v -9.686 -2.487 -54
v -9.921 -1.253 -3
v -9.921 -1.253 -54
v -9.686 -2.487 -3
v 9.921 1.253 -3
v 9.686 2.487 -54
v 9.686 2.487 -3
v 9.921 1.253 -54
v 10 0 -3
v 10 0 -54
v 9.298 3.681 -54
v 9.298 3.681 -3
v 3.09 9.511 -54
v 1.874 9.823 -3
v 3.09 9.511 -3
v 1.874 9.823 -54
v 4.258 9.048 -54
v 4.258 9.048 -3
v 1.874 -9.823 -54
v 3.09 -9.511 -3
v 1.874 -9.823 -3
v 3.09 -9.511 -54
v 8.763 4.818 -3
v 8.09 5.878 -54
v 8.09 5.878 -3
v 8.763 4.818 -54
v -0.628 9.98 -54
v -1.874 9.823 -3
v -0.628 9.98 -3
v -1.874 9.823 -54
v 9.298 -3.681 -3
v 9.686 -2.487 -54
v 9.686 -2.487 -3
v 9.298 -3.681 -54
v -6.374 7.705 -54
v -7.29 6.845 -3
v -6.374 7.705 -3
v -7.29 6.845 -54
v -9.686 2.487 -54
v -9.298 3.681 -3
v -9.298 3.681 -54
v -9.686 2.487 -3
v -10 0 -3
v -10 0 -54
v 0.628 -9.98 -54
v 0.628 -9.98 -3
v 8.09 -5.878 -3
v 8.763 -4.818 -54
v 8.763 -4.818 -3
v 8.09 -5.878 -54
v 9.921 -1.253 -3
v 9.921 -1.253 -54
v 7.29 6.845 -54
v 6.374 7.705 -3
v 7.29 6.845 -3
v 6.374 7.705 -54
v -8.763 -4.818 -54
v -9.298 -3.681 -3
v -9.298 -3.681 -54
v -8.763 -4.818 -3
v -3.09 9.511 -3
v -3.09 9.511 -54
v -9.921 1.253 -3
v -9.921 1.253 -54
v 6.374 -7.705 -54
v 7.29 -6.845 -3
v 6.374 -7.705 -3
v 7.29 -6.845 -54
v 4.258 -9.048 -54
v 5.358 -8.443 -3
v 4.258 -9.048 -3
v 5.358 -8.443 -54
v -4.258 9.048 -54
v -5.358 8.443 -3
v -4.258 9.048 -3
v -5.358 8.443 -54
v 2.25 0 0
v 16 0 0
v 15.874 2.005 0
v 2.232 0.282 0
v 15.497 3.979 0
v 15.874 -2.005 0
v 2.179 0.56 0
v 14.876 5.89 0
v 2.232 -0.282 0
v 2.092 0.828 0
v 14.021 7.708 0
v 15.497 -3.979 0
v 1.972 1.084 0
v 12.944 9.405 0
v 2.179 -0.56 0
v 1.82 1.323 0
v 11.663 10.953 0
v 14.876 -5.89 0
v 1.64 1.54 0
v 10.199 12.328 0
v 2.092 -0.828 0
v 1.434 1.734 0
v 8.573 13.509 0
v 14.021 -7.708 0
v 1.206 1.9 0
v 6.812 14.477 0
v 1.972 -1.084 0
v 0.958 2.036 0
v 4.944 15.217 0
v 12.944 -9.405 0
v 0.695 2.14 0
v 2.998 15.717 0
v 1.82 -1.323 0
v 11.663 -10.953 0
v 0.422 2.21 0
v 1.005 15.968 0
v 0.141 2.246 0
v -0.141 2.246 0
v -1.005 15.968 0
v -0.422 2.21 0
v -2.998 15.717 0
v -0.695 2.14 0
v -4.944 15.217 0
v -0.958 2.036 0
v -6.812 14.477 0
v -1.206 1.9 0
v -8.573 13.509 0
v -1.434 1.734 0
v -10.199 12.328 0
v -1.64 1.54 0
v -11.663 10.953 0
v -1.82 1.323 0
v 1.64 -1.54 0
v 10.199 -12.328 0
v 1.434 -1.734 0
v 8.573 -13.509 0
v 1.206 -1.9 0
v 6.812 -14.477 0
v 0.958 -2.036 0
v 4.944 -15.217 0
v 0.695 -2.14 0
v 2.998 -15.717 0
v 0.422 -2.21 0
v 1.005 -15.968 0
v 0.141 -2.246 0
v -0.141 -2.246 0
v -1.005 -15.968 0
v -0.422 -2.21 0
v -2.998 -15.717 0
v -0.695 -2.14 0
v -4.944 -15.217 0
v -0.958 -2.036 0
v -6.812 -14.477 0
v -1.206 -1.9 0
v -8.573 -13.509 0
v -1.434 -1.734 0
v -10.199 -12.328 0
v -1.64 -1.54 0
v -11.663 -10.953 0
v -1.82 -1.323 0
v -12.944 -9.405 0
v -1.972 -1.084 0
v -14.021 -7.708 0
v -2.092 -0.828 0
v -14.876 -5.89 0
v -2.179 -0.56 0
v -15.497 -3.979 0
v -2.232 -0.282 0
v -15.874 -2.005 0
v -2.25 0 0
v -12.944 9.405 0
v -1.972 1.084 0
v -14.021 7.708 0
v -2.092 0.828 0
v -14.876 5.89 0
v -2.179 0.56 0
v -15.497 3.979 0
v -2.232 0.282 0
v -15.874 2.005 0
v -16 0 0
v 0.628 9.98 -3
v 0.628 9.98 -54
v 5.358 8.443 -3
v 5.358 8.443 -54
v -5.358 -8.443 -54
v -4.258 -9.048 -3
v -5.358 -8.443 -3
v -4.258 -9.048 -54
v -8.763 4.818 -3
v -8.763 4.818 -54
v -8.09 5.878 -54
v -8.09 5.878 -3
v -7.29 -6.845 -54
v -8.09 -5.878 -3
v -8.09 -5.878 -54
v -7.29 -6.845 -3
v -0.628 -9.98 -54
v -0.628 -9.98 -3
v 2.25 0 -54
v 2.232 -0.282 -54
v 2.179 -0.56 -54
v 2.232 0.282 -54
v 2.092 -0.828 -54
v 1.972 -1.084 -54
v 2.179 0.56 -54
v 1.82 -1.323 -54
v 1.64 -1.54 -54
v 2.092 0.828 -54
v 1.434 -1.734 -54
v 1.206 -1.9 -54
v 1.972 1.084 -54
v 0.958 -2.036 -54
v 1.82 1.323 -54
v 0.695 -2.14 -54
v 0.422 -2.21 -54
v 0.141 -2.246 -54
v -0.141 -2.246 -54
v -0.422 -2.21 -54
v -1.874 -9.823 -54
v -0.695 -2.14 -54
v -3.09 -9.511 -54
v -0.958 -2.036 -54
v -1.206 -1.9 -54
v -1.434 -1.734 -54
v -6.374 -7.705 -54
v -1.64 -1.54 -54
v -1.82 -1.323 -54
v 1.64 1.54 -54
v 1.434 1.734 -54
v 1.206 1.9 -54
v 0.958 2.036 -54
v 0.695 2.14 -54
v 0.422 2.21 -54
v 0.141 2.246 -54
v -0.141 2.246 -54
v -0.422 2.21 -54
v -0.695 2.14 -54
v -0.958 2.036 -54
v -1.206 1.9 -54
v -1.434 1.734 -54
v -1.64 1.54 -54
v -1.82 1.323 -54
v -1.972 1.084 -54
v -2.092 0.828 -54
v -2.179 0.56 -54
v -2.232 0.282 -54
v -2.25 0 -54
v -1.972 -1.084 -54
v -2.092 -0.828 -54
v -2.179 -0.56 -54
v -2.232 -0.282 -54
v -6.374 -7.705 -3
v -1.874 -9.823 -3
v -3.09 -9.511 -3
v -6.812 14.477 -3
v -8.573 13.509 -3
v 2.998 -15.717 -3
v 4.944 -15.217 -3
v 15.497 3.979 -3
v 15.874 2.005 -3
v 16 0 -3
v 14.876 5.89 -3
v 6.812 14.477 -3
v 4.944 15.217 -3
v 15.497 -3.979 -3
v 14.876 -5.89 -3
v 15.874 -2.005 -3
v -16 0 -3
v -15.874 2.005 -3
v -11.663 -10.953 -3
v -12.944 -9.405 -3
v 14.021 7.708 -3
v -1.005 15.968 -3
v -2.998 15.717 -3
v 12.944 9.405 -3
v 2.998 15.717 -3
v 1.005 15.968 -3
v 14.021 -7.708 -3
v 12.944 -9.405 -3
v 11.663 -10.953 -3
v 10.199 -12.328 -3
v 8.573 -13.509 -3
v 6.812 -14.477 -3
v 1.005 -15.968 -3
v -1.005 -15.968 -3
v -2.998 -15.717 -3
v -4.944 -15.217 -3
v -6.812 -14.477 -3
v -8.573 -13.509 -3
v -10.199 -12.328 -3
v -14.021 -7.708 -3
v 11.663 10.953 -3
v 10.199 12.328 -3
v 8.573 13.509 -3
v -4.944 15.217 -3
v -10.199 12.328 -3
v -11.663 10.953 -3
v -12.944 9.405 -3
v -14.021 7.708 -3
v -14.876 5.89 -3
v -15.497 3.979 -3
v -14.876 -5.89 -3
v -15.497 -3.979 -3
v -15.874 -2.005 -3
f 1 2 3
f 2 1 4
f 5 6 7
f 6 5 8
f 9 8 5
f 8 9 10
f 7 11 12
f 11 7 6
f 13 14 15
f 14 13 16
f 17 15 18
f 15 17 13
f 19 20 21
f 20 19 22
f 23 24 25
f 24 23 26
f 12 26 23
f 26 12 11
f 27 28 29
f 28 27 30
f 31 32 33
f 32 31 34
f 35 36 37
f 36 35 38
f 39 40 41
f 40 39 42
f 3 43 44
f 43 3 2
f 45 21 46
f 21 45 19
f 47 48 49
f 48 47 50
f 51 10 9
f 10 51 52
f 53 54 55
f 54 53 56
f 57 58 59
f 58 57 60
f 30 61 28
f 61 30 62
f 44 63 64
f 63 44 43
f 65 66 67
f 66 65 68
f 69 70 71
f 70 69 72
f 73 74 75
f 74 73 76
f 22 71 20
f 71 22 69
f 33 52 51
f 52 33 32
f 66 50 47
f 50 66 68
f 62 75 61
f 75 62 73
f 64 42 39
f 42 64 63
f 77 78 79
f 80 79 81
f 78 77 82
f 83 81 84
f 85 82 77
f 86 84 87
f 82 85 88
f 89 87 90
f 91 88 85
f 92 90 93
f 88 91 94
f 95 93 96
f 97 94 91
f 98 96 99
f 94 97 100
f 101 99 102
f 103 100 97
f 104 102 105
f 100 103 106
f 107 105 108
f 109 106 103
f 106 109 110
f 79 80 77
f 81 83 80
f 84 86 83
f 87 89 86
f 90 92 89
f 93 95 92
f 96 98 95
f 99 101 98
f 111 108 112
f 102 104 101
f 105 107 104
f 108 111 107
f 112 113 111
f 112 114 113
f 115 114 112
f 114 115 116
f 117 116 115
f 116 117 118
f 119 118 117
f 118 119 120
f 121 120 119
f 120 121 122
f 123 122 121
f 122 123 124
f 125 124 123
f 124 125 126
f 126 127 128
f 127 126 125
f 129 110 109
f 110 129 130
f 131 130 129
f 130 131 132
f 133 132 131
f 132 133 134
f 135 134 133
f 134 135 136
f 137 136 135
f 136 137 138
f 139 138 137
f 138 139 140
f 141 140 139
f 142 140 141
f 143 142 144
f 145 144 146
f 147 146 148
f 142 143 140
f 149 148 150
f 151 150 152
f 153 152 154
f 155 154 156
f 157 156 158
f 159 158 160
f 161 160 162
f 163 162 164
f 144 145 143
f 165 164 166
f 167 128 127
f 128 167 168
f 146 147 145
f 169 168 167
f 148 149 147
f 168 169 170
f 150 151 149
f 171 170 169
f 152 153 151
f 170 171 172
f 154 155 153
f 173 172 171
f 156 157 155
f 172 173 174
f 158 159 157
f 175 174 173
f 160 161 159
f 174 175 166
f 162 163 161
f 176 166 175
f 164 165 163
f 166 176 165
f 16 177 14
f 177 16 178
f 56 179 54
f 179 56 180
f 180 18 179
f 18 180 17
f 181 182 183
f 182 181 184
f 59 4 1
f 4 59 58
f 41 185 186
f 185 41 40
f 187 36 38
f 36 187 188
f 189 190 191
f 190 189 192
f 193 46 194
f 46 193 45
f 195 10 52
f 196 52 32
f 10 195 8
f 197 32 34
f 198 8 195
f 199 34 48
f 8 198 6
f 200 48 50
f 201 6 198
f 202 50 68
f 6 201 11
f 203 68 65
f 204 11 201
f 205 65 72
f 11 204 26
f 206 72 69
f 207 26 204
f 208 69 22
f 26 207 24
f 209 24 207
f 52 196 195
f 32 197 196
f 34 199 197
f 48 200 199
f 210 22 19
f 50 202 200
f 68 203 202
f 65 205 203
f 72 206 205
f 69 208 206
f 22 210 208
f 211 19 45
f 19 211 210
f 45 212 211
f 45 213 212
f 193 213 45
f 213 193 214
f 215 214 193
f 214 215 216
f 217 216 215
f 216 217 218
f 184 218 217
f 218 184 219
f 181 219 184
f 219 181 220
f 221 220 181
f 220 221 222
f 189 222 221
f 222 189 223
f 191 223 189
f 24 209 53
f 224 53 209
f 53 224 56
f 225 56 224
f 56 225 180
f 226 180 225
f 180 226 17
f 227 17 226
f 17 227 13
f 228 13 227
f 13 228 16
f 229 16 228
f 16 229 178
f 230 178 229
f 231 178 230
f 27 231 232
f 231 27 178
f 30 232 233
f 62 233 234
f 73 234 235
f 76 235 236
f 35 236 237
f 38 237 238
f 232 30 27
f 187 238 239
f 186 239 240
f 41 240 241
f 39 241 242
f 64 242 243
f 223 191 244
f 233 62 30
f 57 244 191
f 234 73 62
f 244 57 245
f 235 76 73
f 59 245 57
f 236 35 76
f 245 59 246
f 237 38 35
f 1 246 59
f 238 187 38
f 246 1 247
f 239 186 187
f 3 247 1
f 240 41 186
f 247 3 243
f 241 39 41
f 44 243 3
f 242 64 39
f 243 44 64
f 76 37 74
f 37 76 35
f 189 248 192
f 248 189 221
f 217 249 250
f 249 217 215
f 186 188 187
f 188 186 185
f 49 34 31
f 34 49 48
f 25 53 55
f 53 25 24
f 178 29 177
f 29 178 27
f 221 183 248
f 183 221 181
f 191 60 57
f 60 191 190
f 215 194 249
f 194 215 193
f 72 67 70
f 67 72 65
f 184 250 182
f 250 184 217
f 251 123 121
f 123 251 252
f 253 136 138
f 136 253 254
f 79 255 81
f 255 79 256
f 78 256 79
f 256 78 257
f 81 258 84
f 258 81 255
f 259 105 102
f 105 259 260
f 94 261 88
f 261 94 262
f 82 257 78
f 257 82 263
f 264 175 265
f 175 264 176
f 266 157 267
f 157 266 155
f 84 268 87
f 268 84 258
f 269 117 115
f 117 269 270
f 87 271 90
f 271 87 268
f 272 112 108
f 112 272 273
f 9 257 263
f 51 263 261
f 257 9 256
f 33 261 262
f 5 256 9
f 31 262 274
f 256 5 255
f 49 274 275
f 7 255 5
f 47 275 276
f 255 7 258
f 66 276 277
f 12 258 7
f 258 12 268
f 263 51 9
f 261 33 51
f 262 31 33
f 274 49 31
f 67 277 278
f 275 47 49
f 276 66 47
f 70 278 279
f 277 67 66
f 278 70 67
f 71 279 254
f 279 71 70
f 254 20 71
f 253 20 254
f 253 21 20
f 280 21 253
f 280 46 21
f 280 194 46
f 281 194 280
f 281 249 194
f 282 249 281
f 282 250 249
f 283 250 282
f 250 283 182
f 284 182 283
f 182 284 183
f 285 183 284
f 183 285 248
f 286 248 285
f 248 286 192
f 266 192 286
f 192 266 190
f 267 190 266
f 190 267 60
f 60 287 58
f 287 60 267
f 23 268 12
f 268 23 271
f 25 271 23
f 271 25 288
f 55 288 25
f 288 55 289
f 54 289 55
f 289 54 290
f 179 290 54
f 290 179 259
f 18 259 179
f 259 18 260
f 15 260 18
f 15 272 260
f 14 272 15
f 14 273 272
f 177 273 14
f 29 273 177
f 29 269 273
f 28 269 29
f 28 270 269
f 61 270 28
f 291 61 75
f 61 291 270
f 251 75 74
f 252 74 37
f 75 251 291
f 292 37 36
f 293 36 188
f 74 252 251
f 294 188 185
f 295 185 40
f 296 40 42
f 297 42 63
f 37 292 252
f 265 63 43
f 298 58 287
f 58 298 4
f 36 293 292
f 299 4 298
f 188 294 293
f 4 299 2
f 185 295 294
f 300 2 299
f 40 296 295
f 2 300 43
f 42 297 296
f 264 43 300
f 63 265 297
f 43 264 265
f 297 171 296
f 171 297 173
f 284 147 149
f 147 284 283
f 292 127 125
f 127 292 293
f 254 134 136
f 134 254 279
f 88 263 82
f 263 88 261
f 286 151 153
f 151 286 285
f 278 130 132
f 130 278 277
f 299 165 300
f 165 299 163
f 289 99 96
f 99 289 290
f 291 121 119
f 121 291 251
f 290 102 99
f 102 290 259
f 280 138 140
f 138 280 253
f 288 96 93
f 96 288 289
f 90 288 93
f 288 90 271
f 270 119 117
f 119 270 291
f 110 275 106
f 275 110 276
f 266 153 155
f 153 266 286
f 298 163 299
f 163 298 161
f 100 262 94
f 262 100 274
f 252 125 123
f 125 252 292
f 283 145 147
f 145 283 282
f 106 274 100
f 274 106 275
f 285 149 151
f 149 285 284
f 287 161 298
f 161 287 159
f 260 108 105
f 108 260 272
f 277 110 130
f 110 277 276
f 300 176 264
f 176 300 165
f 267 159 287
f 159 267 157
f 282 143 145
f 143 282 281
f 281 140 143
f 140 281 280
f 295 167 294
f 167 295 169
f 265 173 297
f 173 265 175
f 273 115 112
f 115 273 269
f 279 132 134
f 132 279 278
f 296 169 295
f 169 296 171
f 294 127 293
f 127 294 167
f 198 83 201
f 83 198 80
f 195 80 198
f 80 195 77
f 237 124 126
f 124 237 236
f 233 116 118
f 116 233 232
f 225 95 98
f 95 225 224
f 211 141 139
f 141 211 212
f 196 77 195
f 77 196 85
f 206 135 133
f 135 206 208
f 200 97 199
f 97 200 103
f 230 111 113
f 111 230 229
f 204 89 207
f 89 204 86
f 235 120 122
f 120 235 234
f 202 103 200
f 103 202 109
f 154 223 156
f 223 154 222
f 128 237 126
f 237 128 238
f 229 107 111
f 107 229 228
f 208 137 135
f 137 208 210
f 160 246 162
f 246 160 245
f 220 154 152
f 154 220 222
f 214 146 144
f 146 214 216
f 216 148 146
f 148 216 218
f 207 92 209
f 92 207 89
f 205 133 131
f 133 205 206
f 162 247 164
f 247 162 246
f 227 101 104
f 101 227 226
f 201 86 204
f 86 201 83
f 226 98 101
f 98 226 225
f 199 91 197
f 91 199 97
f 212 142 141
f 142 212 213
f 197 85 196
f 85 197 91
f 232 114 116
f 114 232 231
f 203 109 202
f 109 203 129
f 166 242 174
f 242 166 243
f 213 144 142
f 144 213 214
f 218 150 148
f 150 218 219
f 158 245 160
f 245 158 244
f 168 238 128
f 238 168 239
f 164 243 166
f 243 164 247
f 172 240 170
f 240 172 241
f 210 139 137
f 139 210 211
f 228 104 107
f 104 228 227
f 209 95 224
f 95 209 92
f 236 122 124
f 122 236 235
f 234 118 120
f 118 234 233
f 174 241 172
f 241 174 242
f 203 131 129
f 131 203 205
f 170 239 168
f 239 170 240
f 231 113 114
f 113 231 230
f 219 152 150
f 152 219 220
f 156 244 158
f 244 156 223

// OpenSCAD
$fn = 50;


difference() {
	union() {
		translate(v = [0, 0, -54.0000000000]) {
			cylinder(h = 54, r = 10.0000000000);
		}
		translate(v = [0, 0, -3.0000000000]) {
			cylinder(h = 3, r = 16.0000000000);
		}
	}
	union() {
		#translate(v = [0, 0, -54]) {
			cylinder(h = 54, r = 2.2500000000);
		}
	}
}
